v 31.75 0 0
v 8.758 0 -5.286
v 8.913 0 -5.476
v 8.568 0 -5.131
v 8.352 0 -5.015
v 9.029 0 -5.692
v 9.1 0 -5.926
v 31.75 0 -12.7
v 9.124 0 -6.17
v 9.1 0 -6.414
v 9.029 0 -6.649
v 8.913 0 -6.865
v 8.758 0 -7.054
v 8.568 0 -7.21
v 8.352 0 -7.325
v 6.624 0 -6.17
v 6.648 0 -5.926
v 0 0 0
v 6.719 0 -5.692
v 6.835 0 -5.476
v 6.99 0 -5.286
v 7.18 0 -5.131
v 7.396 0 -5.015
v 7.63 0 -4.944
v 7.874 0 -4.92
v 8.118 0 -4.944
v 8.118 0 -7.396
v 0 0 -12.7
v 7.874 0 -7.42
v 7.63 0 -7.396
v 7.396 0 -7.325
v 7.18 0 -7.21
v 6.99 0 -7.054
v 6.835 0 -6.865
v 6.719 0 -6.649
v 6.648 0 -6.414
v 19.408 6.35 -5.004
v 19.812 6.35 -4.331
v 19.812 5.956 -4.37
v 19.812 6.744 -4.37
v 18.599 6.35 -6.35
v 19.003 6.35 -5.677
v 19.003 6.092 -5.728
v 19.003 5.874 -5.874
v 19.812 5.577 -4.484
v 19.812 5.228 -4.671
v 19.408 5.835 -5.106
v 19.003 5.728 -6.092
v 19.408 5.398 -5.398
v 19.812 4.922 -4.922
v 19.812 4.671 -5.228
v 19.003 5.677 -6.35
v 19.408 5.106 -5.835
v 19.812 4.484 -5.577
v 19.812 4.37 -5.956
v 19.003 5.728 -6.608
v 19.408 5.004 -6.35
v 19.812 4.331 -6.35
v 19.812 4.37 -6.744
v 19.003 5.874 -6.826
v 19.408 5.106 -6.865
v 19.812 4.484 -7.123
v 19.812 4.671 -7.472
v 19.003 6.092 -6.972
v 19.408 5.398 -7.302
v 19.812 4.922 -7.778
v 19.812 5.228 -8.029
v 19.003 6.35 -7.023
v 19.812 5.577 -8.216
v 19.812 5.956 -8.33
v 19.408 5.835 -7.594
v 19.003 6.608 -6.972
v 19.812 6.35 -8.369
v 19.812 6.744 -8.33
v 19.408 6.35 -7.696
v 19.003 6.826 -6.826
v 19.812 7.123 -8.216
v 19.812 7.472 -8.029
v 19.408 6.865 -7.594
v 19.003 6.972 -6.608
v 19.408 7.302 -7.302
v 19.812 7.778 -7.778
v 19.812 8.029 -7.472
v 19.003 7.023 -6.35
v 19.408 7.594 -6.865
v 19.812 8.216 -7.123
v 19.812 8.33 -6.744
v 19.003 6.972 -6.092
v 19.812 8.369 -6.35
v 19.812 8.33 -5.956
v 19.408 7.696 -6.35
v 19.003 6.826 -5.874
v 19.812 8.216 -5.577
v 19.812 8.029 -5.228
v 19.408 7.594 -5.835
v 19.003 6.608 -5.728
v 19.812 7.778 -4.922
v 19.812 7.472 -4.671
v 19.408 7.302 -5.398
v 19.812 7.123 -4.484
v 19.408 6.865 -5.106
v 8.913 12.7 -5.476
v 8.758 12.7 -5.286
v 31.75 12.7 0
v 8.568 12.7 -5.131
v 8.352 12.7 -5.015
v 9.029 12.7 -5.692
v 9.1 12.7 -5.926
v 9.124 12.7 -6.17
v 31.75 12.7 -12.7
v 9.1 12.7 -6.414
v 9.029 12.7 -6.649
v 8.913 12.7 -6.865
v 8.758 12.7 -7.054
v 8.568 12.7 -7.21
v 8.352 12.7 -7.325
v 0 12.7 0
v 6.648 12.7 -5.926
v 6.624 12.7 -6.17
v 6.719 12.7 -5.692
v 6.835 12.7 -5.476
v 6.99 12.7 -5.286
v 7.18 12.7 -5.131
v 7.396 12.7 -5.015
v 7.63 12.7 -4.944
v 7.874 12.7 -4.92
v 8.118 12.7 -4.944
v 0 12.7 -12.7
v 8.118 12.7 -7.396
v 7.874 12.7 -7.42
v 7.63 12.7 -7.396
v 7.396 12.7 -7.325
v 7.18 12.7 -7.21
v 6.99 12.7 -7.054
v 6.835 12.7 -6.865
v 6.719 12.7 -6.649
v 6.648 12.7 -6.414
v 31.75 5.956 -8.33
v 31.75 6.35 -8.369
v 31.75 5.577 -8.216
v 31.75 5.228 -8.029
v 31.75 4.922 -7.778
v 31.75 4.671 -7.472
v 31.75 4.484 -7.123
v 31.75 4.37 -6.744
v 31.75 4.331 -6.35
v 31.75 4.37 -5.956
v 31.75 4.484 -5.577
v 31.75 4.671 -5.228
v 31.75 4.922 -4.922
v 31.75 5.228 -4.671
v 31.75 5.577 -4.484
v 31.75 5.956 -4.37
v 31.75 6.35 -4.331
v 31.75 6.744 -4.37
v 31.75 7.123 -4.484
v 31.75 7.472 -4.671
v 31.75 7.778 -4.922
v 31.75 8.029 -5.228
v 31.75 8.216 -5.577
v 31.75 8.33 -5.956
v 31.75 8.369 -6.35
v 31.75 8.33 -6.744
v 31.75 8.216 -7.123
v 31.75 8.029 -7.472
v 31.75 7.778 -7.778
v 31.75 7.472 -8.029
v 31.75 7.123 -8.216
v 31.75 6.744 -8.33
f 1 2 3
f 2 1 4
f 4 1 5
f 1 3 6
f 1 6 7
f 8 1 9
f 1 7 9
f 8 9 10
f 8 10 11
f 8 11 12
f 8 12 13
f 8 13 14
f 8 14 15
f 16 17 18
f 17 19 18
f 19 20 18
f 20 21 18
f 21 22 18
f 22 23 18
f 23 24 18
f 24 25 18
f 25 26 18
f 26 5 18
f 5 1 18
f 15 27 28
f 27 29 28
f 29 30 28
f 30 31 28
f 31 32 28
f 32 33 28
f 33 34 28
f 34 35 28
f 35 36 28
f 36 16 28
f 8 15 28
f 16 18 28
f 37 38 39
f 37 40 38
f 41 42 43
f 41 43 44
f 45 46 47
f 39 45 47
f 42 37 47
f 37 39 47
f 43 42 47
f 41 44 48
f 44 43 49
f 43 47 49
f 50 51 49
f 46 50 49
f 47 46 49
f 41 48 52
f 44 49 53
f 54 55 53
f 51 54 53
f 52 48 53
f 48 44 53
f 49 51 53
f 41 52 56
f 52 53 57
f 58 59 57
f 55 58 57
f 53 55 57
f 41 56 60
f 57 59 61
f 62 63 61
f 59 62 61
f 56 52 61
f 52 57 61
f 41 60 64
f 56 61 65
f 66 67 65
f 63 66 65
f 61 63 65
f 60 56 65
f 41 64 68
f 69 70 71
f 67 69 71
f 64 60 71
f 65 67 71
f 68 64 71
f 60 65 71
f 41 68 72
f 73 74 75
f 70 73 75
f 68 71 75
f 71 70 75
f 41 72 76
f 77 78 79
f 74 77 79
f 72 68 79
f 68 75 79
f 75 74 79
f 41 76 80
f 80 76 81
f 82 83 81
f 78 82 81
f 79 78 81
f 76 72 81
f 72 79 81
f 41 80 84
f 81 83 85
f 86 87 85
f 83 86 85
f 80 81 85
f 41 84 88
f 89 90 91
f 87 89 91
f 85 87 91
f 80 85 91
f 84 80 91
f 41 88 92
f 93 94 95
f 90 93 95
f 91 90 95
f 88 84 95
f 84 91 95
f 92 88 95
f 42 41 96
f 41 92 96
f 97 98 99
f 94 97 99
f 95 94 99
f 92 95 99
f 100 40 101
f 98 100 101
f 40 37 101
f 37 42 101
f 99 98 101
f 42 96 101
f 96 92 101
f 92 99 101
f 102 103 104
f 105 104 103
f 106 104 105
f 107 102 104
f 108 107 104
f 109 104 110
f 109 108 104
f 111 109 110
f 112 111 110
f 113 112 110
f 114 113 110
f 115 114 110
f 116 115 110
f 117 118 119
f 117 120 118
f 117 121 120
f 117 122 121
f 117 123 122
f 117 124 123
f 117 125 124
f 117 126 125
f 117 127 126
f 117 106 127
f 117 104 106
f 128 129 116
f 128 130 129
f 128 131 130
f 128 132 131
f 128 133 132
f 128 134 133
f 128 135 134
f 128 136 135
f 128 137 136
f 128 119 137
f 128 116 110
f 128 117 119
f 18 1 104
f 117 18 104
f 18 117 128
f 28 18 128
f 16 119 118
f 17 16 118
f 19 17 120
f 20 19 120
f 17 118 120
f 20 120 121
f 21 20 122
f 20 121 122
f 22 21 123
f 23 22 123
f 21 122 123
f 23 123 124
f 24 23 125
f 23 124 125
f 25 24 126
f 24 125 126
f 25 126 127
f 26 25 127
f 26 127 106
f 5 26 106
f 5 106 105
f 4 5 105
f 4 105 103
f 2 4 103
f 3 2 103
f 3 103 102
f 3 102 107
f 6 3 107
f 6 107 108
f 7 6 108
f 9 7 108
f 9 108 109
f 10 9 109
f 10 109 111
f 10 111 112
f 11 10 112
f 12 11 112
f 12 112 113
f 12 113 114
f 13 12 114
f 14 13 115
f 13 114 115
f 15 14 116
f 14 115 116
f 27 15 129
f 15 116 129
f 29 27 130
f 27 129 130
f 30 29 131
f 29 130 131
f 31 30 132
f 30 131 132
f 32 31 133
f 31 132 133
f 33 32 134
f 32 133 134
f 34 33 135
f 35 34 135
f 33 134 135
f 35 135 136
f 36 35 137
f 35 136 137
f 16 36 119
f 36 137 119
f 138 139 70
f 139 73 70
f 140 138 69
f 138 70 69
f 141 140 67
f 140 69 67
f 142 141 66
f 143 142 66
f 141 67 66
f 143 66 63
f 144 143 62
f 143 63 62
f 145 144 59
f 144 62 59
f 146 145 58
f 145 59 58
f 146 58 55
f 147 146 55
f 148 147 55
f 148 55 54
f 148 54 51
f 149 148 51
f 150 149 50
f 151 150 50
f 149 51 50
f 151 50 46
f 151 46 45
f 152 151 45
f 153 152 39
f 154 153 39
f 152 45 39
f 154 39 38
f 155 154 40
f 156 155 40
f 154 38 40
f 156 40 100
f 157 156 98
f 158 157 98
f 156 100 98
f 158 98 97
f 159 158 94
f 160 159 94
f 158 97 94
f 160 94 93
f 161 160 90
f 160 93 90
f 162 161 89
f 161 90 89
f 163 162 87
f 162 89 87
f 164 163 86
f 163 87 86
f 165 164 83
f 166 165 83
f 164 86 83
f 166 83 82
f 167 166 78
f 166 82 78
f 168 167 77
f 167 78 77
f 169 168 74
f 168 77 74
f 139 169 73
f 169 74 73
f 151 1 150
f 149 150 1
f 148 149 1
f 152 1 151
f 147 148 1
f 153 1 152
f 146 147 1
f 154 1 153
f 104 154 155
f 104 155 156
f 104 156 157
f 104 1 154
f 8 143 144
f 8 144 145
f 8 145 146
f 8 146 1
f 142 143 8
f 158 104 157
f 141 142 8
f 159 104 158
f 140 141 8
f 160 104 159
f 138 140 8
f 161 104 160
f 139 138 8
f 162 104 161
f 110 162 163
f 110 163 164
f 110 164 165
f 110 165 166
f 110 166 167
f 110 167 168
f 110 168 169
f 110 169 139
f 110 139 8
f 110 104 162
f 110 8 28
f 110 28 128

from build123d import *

# Parameters (mm, degrees)
SKETCH1_W                  = 12.7
SKETCH1_H                  = 12.7
BOSS_EXTRUDE1_DEPTH        = 31.75
F_10_32_TAPPED_HOLE1_D     = 4.0386
F_10_32_TAPPED_HOLE1_DEPTH = 11.938
F_10_32_TAPPED_HOLE1_TIP   = 1.213317848
M3X0_5_TAPPED_HOLE1_D      = 2.5


with BuildPart() as part:
    # Sketch1 → Boss-Extrude1 (new body)
    with BuildSketch(Plane(origin=(0, 0, 0), x_dir=(0, 0, -1), z_dir=(1, 0, 0))):
        with Locations((6.35, 6.35)):
            Rectangle(SKETCH1_W, SKETCH1_H)
    extrude(amount=BOSS_EXTRUDE1_DEPTH)

    # #10-32 Tapped Hole1
    with Locations(Plane(origin=(31.75, 0.23991288, -27.515191368), x_dir=(0, 0, 1), z_dir=(1, 0, 0))):
        with Locations((21.165191368, -6.11008712)):
            Hole(F_10_32_TAPPED_HOLE1_D / 2, depth=F_10_32_TAPPED_HOLE1_DEPTH)
            with Locations((0, 0, -(F_10_32_TAPPED_HOLE1_DEPTH + F_10_32_TAPPED_HOLE1_TIP / 2))):  # 118° drill point
                Cone(0, F_10_32_TAPPED_HOLE1_D / 2, F_10_32_TAPPED_HOLE1_TIP, mode=Mode.SUBTRACT)

    # M3x0.5 Tapped Hole1 (through all)
    with Locations(Plane(origin=(0.397447268, 0, -0.674798578), x_dir=(1, 0, 0), z_dir=(0, -1, 0))):
        with Locations((7.476552732, -5.495536137)):
            Hole(M3X0_5_TAPPED_HOLE1_D / 2)


solid = part.part
